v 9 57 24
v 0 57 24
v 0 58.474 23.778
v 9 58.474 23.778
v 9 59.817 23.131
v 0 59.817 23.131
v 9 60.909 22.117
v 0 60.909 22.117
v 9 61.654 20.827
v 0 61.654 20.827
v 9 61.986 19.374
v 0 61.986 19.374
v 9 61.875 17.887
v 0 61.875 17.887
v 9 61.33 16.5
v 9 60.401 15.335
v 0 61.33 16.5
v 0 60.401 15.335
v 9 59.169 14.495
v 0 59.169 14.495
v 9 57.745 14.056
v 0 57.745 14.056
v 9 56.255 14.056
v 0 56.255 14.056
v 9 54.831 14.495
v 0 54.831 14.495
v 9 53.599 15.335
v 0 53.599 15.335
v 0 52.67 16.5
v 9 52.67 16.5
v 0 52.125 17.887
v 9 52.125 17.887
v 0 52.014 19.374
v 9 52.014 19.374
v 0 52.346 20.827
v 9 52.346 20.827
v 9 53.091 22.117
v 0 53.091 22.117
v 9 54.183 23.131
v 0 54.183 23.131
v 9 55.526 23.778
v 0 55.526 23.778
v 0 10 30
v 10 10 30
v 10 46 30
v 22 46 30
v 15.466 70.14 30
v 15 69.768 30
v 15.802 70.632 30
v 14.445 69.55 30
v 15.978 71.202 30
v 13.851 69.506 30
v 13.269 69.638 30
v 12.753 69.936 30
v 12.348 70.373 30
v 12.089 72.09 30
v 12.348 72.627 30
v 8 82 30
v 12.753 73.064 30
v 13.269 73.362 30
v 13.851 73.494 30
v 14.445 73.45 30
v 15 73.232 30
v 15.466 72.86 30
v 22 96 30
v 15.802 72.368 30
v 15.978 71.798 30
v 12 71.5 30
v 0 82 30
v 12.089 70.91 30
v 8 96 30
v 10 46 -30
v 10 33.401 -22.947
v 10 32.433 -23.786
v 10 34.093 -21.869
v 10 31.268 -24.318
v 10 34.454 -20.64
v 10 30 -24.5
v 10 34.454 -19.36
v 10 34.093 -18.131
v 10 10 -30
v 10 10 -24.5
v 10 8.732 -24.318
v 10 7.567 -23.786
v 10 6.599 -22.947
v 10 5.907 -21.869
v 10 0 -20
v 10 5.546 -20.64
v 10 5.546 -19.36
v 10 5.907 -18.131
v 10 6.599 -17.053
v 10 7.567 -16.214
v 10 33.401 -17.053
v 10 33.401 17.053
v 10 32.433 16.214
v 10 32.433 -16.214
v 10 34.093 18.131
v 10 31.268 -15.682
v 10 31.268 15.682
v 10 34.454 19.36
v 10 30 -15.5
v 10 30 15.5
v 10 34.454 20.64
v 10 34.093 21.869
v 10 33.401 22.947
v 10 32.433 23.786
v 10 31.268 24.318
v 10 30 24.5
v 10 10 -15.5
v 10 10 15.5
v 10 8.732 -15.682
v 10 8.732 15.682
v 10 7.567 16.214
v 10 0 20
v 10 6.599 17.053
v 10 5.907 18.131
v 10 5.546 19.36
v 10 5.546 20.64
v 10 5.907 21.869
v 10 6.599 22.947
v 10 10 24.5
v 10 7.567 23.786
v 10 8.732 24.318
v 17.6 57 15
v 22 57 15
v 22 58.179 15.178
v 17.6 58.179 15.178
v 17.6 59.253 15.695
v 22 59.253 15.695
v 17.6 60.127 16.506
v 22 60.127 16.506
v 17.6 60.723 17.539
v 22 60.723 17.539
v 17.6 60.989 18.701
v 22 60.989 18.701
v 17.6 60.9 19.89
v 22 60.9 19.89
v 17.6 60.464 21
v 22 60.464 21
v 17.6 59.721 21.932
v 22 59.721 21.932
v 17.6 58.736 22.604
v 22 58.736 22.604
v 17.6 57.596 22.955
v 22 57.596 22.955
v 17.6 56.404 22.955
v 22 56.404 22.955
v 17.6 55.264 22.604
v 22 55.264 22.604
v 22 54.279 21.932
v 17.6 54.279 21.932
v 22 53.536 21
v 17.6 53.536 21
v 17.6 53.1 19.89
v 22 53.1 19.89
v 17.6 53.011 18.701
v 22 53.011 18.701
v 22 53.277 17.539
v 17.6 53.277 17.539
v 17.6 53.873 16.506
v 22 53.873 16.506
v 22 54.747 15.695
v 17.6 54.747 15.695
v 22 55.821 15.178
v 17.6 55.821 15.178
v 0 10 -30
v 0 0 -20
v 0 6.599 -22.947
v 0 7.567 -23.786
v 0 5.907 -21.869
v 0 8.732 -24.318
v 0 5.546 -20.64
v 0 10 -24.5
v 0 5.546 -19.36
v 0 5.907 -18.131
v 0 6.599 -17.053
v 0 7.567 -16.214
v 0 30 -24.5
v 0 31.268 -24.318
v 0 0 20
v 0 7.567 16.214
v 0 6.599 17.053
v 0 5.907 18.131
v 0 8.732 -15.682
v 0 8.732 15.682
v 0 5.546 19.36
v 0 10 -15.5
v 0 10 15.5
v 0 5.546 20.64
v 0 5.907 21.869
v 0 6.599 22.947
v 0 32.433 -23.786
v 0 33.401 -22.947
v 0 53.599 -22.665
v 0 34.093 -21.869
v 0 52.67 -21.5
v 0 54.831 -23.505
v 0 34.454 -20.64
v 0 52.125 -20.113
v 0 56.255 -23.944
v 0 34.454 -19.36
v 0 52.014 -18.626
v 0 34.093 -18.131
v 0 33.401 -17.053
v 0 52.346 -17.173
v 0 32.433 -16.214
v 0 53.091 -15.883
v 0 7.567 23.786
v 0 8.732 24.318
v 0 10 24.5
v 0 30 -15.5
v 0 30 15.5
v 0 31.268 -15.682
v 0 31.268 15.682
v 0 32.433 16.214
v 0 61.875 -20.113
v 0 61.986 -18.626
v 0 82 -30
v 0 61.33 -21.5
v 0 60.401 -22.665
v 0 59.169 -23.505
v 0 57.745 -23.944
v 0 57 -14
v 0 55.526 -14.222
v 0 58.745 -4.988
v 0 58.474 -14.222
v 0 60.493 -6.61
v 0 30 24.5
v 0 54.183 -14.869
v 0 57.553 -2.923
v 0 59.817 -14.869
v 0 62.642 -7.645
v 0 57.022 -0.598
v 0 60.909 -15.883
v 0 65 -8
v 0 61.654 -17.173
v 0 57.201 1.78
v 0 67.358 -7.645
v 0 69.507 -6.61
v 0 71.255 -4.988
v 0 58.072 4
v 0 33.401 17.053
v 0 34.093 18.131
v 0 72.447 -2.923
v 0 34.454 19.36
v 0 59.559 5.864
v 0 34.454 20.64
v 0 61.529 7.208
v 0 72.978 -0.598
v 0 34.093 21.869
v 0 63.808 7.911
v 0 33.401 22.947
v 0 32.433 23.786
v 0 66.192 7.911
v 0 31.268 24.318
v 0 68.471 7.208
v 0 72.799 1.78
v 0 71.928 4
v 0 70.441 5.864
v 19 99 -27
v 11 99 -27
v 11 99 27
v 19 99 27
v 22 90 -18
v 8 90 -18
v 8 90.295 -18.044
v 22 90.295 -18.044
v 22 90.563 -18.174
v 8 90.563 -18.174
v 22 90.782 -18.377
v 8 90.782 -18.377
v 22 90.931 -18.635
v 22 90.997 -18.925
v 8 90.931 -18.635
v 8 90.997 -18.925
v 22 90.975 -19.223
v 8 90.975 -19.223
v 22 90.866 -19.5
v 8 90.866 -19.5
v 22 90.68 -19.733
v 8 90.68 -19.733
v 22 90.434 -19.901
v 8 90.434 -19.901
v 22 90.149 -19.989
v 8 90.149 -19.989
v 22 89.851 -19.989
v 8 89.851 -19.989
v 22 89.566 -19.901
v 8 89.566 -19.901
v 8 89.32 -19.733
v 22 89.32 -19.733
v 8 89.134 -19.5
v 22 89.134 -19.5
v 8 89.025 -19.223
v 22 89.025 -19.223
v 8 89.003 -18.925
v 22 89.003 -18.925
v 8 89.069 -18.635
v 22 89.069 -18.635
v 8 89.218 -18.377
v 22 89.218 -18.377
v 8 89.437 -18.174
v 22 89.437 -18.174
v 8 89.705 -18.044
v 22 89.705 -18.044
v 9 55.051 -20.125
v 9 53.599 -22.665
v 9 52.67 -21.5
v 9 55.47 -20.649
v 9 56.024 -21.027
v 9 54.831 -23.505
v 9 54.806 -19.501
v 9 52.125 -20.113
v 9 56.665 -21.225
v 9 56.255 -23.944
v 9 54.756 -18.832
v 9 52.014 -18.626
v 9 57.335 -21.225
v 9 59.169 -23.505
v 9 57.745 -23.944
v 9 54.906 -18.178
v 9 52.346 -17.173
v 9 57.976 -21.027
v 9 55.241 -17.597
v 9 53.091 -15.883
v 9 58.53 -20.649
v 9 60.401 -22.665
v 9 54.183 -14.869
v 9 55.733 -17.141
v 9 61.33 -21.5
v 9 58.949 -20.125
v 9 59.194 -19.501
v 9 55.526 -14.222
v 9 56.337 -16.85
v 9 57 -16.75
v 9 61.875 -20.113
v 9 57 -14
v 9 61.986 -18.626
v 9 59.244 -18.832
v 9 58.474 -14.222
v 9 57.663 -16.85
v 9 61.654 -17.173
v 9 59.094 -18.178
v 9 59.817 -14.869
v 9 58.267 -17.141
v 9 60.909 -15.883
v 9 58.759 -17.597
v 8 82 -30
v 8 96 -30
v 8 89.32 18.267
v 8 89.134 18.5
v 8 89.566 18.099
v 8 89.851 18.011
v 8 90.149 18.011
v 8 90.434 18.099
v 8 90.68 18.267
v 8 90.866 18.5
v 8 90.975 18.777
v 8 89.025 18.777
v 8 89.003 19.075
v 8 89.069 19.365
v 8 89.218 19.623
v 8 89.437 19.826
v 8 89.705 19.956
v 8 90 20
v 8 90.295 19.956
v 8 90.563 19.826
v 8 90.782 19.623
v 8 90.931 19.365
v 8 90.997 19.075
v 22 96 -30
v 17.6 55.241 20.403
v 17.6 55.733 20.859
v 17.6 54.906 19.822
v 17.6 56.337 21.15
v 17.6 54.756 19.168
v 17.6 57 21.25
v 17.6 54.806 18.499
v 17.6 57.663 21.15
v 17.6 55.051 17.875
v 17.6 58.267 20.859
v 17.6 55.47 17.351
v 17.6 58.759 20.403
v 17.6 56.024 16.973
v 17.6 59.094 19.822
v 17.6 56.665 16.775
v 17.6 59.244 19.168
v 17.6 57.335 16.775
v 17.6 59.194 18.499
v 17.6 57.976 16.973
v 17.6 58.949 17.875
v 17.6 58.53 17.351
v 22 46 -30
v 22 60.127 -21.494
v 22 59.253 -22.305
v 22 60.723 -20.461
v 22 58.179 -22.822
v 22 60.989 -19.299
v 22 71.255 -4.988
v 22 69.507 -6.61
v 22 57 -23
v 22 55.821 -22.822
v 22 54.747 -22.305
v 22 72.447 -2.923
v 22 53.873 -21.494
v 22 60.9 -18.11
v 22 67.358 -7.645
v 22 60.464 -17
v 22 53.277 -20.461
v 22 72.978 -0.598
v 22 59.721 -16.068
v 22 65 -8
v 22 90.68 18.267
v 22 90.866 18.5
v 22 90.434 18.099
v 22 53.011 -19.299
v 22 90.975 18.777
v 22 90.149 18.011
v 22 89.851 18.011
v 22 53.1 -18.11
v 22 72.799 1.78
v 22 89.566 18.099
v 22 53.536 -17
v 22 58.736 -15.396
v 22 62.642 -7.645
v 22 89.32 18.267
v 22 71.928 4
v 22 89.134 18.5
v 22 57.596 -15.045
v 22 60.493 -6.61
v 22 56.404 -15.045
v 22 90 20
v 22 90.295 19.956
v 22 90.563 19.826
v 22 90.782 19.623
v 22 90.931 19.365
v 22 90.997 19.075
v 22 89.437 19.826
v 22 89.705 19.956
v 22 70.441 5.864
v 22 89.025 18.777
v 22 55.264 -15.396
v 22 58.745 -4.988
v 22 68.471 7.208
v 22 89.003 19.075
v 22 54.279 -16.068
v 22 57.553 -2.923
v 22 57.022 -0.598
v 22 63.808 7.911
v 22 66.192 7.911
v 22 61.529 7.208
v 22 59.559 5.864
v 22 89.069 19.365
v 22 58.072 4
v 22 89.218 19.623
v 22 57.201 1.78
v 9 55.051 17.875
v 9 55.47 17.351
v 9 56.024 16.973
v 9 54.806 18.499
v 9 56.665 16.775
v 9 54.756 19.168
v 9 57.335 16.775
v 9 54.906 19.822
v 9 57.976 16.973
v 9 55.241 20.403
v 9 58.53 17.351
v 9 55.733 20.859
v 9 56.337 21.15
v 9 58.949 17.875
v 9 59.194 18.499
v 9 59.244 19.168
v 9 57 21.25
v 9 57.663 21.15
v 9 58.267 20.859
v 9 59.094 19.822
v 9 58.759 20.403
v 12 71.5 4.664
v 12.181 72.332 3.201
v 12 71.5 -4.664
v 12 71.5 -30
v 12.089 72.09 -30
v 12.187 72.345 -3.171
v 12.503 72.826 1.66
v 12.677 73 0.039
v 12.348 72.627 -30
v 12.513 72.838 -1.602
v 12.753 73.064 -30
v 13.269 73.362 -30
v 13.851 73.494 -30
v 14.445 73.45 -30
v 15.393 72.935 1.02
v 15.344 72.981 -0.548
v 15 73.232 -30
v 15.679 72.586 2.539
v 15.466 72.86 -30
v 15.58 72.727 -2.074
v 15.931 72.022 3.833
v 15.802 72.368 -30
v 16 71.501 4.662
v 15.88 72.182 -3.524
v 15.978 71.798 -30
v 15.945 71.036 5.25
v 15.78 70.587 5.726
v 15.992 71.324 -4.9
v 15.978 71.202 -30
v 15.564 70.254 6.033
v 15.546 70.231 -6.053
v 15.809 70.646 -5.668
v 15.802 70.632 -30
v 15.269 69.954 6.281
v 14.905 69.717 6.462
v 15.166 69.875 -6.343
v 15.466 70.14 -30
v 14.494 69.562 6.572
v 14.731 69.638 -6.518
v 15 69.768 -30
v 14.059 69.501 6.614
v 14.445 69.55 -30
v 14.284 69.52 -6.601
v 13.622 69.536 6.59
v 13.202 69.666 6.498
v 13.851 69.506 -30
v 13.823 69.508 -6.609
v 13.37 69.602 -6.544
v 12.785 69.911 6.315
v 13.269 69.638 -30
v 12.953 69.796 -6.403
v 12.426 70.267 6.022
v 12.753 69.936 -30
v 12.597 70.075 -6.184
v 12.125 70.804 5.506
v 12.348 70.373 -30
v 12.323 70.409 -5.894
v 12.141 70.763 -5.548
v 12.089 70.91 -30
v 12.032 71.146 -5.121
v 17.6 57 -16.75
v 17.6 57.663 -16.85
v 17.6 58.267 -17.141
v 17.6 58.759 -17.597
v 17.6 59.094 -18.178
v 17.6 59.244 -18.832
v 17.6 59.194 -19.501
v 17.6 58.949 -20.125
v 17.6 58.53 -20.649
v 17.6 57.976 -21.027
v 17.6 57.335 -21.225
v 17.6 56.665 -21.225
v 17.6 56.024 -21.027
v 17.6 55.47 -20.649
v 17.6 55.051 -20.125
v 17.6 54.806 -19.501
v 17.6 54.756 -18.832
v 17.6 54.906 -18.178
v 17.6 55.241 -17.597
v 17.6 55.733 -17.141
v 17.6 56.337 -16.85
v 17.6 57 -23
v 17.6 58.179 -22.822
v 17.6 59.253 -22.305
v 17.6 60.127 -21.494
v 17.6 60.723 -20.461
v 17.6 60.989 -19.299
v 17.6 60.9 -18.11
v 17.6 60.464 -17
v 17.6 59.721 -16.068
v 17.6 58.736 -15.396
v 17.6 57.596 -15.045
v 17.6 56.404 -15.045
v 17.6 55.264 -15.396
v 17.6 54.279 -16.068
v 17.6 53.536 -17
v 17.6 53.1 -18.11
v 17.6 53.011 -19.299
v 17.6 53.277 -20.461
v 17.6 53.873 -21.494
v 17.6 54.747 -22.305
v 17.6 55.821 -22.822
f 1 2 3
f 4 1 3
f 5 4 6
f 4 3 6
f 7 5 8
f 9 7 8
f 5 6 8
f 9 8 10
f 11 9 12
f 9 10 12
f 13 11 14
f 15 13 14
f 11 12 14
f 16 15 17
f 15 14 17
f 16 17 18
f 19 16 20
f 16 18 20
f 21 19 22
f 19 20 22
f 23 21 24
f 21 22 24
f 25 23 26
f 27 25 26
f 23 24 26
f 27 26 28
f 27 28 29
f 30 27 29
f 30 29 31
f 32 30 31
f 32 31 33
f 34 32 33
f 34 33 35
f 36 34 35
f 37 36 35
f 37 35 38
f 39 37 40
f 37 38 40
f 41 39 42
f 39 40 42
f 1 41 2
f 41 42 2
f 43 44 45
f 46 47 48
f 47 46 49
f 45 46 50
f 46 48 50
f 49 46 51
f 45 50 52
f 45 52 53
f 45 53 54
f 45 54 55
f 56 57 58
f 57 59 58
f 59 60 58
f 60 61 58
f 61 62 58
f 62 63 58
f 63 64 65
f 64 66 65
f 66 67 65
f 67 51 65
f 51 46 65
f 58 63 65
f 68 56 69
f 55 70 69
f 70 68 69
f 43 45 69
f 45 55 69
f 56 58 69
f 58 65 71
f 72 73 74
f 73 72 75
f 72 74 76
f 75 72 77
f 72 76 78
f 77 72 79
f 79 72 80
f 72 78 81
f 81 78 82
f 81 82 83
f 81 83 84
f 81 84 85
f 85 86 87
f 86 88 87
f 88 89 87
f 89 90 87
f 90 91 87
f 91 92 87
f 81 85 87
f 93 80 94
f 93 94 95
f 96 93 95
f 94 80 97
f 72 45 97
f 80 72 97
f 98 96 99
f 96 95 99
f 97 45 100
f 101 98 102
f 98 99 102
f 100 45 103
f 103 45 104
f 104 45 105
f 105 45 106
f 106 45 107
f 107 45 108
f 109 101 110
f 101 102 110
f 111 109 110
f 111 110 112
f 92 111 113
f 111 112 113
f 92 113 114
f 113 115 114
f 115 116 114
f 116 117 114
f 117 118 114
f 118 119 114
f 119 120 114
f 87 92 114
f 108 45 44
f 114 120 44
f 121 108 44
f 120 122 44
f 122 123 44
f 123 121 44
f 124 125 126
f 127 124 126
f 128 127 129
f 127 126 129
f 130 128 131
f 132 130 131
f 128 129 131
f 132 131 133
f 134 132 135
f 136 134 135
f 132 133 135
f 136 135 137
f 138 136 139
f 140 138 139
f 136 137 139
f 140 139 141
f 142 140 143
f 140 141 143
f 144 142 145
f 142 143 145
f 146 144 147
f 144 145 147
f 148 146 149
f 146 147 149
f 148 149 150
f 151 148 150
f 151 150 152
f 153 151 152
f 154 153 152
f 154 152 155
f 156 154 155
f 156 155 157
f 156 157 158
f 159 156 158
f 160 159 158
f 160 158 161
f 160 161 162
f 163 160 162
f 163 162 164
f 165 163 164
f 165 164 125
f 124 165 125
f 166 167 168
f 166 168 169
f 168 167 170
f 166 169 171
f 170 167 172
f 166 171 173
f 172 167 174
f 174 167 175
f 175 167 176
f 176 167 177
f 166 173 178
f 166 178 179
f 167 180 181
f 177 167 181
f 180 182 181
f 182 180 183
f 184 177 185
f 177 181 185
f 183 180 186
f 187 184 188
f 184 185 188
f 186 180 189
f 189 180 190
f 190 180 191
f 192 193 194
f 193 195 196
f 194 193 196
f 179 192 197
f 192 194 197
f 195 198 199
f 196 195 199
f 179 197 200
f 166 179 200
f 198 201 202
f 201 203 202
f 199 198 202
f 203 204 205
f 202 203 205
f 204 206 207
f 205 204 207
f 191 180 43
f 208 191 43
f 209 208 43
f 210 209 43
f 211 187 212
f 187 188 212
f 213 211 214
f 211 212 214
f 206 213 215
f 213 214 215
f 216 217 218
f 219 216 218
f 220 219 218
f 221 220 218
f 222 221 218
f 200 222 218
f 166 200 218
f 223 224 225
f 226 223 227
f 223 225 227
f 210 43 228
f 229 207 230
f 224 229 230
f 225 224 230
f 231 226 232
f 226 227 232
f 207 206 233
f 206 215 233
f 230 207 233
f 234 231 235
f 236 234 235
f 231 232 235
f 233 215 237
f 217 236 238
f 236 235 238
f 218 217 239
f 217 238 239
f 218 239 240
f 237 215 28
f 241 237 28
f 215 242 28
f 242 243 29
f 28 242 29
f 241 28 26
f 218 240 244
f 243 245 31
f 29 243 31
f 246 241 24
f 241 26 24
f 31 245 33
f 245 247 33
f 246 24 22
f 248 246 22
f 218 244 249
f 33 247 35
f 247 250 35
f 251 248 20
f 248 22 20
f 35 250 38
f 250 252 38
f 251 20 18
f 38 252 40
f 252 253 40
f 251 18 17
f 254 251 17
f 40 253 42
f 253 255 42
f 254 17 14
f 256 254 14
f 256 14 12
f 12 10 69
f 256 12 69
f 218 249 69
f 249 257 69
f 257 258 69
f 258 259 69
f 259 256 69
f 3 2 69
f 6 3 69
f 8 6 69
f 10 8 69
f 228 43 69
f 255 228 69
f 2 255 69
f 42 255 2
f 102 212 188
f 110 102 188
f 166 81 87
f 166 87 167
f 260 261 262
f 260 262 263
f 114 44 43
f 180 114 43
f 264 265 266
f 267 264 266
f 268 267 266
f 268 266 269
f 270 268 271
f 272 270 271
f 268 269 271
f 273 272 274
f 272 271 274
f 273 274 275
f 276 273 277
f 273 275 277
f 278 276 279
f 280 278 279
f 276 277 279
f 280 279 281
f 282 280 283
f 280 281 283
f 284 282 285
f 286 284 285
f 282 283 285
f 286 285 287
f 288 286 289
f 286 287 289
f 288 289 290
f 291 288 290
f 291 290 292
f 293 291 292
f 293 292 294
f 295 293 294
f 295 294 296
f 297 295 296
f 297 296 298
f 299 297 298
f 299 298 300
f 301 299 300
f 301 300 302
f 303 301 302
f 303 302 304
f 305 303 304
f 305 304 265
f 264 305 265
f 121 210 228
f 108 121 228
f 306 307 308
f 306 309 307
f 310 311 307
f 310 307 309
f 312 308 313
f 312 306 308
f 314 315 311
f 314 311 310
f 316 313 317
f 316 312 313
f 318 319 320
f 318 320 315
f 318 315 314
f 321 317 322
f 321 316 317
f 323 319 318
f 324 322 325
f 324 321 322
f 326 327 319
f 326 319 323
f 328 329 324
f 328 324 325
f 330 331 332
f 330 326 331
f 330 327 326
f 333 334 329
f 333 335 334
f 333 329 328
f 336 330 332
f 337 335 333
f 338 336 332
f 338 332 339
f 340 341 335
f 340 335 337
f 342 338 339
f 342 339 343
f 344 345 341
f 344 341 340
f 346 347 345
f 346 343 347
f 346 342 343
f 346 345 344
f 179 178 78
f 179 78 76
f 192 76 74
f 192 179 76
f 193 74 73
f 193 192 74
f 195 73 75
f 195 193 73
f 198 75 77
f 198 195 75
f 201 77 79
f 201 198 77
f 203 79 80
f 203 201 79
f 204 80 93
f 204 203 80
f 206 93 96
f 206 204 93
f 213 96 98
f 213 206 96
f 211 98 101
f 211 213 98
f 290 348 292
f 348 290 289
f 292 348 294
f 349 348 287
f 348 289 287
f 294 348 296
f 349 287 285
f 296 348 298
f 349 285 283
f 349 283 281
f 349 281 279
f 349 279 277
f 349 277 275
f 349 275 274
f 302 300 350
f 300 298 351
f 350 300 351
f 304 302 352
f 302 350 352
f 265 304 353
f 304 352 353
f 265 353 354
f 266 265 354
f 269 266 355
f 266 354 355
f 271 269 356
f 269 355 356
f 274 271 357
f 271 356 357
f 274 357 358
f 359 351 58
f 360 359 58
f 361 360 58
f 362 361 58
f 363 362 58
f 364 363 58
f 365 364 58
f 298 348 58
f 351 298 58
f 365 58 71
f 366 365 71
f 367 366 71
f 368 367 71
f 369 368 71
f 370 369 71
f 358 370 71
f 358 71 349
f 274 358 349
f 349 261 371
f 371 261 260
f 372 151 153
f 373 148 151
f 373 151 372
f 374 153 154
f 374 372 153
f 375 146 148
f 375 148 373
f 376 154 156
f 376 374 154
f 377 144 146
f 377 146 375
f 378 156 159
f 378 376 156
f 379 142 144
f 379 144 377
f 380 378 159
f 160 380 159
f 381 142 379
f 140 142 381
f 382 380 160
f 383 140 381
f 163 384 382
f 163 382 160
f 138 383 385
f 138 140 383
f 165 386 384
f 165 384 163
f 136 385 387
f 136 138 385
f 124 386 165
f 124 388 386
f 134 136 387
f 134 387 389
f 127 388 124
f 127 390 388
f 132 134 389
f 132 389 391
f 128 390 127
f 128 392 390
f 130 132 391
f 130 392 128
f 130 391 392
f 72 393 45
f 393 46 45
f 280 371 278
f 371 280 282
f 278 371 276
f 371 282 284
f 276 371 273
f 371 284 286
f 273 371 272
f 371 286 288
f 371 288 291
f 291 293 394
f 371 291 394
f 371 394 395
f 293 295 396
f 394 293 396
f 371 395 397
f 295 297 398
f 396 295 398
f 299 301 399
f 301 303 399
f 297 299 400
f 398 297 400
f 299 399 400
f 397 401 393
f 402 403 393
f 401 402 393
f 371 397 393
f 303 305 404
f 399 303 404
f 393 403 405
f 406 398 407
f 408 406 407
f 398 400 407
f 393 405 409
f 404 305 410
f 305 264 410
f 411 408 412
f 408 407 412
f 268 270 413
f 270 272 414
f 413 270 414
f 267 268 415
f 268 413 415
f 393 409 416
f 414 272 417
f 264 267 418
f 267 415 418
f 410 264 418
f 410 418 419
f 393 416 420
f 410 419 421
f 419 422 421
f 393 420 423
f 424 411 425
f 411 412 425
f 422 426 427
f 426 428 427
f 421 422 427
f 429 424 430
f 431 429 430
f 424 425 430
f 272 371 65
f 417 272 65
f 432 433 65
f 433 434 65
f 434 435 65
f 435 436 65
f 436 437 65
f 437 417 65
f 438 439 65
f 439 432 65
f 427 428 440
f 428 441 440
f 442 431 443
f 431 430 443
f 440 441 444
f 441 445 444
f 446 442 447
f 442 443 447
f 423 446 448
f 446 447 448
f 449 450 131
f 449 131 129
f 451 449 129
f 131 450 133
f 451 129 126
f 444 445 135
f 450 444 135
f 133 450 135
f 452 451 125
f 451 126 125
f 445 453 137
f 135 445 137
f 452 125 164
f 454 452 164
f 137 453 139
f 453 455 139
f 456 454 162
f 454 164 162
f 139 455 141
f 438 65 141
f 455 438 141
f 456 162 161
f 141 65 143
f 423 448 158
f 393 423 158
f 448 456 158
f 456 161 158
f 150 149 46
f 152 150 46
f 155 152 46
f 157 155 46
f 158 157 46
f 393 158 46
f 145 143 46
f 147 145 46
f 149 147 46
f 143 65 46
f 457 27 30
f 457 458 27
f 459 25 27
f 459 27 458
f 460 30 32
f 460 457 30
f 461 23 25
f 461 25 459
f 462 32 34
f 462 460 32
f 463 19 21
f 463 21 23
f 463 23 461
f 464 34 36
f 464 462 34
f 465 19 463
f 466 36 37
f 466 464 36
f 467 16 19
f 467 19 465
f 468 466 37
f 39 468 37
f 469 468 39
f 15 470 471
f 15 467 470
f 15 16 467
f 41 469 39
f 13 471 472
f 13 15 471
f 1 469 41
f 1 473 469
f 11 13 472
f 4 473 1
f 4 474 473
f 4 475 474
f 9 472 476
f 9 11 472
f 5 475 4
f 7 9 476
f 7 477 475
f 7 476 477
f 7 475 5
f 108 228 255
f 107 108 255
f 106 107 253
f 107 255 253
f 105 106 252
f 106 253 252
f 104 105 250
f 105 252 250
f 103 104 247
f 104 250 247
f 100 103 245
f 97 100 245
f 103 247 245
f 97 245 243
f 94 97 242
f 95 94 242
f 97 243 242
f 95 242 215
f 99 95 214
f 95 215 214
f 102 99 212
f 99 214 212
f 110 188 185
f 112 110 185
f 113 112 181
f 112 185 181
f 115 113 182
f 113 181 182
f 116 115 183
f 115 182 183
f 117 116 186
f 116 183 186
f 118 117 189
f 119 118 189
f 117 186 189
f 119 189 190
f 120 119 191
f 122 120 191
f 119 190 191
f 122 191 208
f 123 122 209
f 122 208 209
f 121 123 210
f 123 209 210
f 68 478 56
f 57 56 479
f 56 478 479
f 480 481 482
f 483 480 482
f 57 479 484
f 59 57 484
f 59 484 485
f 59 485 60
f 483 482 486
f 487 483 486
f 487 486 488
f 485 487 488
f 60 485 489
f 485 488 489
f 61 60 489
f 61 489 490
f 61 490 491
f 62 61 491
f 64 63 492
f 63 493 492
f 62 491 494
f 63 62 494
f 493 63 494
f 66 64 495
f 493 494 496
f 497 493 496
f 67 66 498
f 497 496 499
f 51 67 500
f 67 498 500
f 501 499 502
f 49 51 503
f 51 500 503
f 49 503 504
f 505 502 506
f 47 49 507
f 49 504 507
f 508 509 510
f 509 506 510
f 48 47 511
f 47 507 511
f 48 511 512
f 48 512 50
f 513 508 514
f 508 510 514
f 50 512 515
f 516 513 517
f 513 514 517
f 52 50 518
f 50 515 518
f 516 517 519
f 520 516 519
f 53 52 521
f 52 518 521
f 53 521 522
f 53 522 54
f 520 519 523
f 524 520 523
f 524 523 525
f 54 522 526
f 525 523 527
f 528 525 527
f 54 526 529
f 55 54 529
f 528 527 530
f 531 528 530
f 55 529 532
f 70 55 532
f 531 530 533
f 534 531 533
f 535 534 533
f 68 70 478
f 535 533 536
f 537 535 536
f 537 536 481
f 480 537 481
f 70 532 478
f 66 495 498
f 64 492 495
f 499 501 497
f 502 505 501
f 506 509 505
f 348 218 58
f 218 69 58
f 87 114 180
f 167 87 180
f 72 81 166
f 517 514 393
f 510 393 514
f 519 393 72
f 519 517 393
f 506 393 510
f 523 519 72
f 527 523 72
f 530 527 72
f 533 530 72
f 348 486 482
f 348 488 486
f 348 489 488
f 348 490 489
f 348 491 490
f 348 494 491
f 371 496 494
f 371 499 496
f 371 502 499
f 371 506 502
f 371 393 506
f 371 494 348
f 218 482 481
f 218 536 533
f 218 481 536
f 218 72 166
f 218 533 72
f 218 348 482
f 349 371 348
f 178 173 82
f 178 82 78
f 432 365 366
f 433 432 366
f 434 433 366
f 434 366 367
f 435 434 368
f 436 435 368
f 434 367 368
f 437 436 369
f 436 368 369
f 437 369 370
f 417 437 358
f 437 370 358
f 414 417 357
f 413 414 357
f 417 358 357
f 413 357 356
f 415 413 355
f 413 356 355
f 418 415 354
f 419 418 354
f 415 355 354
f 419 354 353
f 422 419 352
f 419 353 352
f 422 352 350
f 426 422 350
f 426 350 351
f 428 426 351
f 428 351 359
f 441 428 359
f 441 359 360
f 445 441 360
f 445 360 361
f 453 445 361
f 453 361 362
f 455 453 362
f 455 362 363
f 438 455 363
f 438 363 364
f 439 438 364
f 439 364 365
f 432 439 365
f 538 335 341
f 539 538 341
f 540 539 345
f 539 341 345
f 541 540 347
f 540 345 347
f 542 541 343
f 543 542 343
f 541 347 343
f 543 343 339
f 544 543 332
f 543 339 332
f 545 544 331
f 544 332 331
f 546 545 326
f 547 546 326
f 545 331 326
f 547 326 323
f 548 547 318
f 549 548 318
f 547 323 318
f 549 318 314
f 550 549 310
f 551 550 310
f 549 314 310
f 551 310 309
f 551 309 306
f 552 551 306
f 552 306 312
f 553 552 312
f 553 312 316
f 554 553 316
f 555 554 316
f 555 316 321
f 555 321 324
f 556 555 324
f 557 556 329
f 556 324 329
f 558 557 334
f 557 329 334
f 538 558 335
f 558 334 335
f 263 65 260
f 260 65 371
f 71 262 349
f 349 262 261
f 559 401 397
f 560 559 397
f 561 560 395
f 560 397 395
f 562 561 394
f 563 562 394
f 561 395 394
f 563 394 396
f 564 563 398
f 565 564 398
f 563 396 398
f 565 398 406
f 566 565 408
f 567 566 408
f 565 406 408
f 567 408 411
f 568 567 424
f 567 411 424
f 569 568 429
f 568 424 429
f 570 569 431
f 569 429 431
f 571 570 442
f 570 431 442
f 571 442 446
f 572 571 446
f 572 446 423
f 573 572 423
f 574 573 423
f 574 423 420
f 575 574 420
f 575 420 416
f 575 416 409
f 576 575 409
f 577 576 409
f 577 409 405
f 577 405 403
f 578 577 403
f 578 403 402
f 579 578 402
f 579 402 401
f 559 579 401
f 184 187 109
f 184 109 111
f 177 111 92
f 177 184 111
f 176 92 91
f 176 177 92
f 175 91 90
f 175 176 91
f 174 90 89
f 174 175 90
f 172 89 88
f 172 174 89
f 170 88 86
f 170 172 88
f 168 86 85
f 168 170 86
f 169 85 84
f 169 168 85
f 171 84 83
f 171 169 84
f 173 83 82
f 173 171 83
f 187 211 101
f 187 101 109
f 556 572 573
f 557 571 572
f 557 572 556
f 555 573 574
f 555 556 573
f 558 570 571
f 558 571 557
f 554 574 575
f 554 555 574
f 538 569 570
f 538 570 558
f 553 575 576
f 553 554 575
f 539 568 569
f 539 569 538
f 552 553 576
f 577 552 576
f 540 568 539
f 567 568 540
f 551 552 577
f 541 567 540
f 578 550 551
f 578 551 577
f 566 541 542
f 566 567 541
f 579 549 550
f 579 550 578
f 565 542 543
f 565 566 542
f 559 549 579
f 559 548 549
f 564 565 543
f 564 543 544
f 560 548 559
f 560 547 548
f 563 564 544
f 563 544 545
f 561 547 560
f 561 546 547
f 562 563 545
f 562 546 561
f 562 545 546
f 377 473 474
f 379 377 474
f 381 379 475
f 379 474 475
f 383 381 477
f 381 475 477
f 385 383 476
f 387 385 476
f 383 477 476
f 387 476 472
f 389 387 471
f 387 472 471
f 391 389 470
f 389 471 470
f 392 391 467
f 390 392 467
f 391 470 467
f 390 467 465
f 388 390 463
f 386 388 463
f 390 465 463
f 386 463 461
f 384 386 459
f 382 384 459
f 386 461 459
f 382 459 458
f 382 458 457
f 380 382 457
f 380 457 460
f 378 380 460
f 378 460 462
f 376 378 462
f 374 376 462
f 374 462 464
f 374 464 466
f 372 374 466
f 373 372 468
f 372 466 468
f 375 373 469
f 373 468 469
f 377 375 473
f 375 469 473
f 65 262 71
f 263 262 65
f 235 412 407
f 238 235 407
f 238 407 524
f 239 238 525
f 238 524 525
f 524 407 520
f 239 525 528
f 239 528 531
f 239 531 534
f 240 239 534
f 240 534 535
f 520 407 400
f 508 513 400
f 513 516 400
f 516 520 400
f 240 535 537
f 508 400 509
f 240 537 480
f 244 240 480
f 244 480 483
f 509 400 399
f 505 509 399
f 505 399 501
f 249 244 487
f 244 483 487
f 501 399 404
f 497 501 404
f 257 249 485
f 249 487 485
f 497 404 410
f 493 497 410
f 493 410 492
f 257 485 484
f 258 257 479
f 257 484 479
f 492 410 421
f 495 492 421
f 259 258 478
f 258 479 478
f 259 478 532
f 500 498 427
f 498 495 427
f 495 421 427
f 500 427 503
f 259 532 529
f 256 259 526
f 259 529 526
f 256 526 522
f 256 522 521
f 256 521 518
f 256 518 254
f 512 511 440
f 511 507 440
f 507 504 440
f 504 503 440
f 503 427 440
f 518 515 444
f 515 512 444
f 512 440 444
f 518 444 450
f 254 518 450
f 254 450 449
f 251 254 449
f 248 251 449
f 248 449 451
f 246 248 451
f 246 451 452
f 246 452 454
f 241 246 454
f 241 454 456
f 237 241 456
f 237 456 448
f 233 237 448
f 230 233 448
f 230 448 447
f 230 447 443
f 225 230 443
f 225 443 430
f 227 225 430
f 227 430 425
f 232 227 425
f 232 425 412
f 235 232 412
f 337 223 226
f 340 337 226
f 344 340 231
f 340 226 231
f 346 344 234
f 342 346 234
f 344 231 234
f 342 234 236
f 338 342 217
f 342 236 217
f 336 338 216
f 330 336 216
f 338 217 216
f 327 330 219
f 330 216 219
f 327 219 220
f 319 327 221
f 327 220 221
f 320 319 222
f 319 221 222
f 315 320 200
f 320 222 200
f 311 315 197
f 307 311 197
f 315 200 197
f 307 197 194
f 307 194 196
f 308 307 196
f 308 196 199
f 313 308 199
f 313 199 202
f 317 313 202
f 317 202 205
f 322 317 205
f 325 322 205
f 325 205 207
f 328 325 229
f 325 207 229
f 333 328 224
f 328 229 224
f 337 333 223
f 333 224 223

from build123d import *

# Parameters (mm, degrees)
EXTRUDE_1_DEPTH              = 30
CUT_EXTRUDE_1_DEPTH          = 23
HOLE_WIZARD_M4_1_D           = 4.5
HOLE_WIZARD_M4_1_CBORE_D     = 8
HOLE_WIZARD_M4_1_CBORE_DEPTH = 4.4
SKETCH_6_R                   = 5
CUT_EXTRUDE_2_DEPTH          = 9
SKETCH_7_R                   = 8
CUT_EXTRUDE_3_DEPTH          = 23
HOLE_WIZARD_M4_1_2_D         = 2
HOLE_WIZARD_M4_2_D           = 4
CHAMFER_1_SIZE               = 10
CHAMFER_2_SIZE               = 3


with BuildPart() as part:
    # 스케치1 → 보스-돌출1 (new body, symmetric)
    with BuildSketch(Plane.XY):
        Polygon((0, 0), (0, 82), (8, 82), (8, 99), (22, 99), (22, 46), (10, 46), (10, 0), align=None)
    extrude(amount=EXTRUDE_1_DEPTH, both=True)

    # 스케치2 → 컷-돌출1 (cut, through all)
    with BuildSketch(Plane.ZY):
        with BuildLine():
            Line((-15.5, 30), (-15.5, 10))
            ThreePointArc((-15.5, 10), (-20, 5.5), (-24.5, 10))
            Line((-24.5, 10), (-24.5, 30))
            ThreePointArc((-24.5, 30), (-20, 34.5), (-15.5, 30))
        make_face()
        with BuildLine():
            Line((15.5, 30), (15.5, 10))
            ThreePointArc((15.5, 10), (20, 5.5), (24.5, 10))
            Line((24.5, 10), (24.5, 30))
            ThreePointArc((24.5, 30), (20, 34.5), (15.5, 30))
        make_face()
    extrude(amount=-CUT_EXTRUDE_1_DEPTH, mode=Mode.SUBTRACT)

    # Hole Wizard M4 _ _ _ _ _1 (through all)
    with Locations(Plane(origin=(22, 0, 0), x_dir=(0, 0, -1), z_dir=(1, 0, 0))):
        with Locations((-19, 57), (19, 57)):
            CounterBoreHole(HOLE_WIZARD_M4_1_D / 2, HOLE_WIZARD_M4_1_CBORE_D / 2, HOLE_WIZARD_M4_1_CBORE_DEPTH)

    # 스케치6 → 컷-돌출2 (cut)
    with BuildSketch(Plane.ZY):
        with Locations((-19, 57)):
            Circle(SKETCH_6_R)
        with Locations((19, 57)):
            Circle(SKETCH_6_R)
    extrude(amount=-CUT_EXTRUDE_2_DEPTH, mode=Mode.SUBTRACT)

    # 스케치7 → 컷-돌출3 (cut, through all)
    with BuildSketch(Plane(origin=(22, 0, 0), x_dir=(0, 0, -1), z_dir=(1, 0, 0))):
        with Locations((0, 65)):
            Circle(SKETCH_7_R)
    extrude(amount=-CUT_EXTRUDE_3_DEPTH, mode=Mode.SUBTRACT)

    # Hole Wizard M4 _ _1 2 (through all)
    with Locations(Plane(origin=(22, 0, 0), x_dir=(0, 0, -1), z_dir=(1, 0, 0))):
        with Locations((-19, 90), (19, 90)):
            Hole(HOLE_WIZARD_M4_1_2_D / 2)

    # M4 여유 구멍2 (through all)
    with Locations(Plane.XY.offset(30)):
        with Locations((14, 71.5)):
            Hole(HOLE_WIZARD_M4_2_D / 2)

    # 모따기1
    chamfer_1_edges = [part.edges().sort_by_distance(p)[0] for p in [
        (5, 0, -30),
        (5, 0, 30),
    ]]
    chamfer(chamfer_1_edges, length=CHAMFER_1_SIZE)

    # 모따기2
    chamfer_2_edges = [part.edges().sort_by_distance(p)[0] for p in [
        (8, 99, 0),
        (22, 99, 0),
        (15, 99, 30),
        (15, 99, -30),
    ]]
    chamfer(chamfer_2_edges, length=CHAMFER_2_SIZE)


solid = part.part
